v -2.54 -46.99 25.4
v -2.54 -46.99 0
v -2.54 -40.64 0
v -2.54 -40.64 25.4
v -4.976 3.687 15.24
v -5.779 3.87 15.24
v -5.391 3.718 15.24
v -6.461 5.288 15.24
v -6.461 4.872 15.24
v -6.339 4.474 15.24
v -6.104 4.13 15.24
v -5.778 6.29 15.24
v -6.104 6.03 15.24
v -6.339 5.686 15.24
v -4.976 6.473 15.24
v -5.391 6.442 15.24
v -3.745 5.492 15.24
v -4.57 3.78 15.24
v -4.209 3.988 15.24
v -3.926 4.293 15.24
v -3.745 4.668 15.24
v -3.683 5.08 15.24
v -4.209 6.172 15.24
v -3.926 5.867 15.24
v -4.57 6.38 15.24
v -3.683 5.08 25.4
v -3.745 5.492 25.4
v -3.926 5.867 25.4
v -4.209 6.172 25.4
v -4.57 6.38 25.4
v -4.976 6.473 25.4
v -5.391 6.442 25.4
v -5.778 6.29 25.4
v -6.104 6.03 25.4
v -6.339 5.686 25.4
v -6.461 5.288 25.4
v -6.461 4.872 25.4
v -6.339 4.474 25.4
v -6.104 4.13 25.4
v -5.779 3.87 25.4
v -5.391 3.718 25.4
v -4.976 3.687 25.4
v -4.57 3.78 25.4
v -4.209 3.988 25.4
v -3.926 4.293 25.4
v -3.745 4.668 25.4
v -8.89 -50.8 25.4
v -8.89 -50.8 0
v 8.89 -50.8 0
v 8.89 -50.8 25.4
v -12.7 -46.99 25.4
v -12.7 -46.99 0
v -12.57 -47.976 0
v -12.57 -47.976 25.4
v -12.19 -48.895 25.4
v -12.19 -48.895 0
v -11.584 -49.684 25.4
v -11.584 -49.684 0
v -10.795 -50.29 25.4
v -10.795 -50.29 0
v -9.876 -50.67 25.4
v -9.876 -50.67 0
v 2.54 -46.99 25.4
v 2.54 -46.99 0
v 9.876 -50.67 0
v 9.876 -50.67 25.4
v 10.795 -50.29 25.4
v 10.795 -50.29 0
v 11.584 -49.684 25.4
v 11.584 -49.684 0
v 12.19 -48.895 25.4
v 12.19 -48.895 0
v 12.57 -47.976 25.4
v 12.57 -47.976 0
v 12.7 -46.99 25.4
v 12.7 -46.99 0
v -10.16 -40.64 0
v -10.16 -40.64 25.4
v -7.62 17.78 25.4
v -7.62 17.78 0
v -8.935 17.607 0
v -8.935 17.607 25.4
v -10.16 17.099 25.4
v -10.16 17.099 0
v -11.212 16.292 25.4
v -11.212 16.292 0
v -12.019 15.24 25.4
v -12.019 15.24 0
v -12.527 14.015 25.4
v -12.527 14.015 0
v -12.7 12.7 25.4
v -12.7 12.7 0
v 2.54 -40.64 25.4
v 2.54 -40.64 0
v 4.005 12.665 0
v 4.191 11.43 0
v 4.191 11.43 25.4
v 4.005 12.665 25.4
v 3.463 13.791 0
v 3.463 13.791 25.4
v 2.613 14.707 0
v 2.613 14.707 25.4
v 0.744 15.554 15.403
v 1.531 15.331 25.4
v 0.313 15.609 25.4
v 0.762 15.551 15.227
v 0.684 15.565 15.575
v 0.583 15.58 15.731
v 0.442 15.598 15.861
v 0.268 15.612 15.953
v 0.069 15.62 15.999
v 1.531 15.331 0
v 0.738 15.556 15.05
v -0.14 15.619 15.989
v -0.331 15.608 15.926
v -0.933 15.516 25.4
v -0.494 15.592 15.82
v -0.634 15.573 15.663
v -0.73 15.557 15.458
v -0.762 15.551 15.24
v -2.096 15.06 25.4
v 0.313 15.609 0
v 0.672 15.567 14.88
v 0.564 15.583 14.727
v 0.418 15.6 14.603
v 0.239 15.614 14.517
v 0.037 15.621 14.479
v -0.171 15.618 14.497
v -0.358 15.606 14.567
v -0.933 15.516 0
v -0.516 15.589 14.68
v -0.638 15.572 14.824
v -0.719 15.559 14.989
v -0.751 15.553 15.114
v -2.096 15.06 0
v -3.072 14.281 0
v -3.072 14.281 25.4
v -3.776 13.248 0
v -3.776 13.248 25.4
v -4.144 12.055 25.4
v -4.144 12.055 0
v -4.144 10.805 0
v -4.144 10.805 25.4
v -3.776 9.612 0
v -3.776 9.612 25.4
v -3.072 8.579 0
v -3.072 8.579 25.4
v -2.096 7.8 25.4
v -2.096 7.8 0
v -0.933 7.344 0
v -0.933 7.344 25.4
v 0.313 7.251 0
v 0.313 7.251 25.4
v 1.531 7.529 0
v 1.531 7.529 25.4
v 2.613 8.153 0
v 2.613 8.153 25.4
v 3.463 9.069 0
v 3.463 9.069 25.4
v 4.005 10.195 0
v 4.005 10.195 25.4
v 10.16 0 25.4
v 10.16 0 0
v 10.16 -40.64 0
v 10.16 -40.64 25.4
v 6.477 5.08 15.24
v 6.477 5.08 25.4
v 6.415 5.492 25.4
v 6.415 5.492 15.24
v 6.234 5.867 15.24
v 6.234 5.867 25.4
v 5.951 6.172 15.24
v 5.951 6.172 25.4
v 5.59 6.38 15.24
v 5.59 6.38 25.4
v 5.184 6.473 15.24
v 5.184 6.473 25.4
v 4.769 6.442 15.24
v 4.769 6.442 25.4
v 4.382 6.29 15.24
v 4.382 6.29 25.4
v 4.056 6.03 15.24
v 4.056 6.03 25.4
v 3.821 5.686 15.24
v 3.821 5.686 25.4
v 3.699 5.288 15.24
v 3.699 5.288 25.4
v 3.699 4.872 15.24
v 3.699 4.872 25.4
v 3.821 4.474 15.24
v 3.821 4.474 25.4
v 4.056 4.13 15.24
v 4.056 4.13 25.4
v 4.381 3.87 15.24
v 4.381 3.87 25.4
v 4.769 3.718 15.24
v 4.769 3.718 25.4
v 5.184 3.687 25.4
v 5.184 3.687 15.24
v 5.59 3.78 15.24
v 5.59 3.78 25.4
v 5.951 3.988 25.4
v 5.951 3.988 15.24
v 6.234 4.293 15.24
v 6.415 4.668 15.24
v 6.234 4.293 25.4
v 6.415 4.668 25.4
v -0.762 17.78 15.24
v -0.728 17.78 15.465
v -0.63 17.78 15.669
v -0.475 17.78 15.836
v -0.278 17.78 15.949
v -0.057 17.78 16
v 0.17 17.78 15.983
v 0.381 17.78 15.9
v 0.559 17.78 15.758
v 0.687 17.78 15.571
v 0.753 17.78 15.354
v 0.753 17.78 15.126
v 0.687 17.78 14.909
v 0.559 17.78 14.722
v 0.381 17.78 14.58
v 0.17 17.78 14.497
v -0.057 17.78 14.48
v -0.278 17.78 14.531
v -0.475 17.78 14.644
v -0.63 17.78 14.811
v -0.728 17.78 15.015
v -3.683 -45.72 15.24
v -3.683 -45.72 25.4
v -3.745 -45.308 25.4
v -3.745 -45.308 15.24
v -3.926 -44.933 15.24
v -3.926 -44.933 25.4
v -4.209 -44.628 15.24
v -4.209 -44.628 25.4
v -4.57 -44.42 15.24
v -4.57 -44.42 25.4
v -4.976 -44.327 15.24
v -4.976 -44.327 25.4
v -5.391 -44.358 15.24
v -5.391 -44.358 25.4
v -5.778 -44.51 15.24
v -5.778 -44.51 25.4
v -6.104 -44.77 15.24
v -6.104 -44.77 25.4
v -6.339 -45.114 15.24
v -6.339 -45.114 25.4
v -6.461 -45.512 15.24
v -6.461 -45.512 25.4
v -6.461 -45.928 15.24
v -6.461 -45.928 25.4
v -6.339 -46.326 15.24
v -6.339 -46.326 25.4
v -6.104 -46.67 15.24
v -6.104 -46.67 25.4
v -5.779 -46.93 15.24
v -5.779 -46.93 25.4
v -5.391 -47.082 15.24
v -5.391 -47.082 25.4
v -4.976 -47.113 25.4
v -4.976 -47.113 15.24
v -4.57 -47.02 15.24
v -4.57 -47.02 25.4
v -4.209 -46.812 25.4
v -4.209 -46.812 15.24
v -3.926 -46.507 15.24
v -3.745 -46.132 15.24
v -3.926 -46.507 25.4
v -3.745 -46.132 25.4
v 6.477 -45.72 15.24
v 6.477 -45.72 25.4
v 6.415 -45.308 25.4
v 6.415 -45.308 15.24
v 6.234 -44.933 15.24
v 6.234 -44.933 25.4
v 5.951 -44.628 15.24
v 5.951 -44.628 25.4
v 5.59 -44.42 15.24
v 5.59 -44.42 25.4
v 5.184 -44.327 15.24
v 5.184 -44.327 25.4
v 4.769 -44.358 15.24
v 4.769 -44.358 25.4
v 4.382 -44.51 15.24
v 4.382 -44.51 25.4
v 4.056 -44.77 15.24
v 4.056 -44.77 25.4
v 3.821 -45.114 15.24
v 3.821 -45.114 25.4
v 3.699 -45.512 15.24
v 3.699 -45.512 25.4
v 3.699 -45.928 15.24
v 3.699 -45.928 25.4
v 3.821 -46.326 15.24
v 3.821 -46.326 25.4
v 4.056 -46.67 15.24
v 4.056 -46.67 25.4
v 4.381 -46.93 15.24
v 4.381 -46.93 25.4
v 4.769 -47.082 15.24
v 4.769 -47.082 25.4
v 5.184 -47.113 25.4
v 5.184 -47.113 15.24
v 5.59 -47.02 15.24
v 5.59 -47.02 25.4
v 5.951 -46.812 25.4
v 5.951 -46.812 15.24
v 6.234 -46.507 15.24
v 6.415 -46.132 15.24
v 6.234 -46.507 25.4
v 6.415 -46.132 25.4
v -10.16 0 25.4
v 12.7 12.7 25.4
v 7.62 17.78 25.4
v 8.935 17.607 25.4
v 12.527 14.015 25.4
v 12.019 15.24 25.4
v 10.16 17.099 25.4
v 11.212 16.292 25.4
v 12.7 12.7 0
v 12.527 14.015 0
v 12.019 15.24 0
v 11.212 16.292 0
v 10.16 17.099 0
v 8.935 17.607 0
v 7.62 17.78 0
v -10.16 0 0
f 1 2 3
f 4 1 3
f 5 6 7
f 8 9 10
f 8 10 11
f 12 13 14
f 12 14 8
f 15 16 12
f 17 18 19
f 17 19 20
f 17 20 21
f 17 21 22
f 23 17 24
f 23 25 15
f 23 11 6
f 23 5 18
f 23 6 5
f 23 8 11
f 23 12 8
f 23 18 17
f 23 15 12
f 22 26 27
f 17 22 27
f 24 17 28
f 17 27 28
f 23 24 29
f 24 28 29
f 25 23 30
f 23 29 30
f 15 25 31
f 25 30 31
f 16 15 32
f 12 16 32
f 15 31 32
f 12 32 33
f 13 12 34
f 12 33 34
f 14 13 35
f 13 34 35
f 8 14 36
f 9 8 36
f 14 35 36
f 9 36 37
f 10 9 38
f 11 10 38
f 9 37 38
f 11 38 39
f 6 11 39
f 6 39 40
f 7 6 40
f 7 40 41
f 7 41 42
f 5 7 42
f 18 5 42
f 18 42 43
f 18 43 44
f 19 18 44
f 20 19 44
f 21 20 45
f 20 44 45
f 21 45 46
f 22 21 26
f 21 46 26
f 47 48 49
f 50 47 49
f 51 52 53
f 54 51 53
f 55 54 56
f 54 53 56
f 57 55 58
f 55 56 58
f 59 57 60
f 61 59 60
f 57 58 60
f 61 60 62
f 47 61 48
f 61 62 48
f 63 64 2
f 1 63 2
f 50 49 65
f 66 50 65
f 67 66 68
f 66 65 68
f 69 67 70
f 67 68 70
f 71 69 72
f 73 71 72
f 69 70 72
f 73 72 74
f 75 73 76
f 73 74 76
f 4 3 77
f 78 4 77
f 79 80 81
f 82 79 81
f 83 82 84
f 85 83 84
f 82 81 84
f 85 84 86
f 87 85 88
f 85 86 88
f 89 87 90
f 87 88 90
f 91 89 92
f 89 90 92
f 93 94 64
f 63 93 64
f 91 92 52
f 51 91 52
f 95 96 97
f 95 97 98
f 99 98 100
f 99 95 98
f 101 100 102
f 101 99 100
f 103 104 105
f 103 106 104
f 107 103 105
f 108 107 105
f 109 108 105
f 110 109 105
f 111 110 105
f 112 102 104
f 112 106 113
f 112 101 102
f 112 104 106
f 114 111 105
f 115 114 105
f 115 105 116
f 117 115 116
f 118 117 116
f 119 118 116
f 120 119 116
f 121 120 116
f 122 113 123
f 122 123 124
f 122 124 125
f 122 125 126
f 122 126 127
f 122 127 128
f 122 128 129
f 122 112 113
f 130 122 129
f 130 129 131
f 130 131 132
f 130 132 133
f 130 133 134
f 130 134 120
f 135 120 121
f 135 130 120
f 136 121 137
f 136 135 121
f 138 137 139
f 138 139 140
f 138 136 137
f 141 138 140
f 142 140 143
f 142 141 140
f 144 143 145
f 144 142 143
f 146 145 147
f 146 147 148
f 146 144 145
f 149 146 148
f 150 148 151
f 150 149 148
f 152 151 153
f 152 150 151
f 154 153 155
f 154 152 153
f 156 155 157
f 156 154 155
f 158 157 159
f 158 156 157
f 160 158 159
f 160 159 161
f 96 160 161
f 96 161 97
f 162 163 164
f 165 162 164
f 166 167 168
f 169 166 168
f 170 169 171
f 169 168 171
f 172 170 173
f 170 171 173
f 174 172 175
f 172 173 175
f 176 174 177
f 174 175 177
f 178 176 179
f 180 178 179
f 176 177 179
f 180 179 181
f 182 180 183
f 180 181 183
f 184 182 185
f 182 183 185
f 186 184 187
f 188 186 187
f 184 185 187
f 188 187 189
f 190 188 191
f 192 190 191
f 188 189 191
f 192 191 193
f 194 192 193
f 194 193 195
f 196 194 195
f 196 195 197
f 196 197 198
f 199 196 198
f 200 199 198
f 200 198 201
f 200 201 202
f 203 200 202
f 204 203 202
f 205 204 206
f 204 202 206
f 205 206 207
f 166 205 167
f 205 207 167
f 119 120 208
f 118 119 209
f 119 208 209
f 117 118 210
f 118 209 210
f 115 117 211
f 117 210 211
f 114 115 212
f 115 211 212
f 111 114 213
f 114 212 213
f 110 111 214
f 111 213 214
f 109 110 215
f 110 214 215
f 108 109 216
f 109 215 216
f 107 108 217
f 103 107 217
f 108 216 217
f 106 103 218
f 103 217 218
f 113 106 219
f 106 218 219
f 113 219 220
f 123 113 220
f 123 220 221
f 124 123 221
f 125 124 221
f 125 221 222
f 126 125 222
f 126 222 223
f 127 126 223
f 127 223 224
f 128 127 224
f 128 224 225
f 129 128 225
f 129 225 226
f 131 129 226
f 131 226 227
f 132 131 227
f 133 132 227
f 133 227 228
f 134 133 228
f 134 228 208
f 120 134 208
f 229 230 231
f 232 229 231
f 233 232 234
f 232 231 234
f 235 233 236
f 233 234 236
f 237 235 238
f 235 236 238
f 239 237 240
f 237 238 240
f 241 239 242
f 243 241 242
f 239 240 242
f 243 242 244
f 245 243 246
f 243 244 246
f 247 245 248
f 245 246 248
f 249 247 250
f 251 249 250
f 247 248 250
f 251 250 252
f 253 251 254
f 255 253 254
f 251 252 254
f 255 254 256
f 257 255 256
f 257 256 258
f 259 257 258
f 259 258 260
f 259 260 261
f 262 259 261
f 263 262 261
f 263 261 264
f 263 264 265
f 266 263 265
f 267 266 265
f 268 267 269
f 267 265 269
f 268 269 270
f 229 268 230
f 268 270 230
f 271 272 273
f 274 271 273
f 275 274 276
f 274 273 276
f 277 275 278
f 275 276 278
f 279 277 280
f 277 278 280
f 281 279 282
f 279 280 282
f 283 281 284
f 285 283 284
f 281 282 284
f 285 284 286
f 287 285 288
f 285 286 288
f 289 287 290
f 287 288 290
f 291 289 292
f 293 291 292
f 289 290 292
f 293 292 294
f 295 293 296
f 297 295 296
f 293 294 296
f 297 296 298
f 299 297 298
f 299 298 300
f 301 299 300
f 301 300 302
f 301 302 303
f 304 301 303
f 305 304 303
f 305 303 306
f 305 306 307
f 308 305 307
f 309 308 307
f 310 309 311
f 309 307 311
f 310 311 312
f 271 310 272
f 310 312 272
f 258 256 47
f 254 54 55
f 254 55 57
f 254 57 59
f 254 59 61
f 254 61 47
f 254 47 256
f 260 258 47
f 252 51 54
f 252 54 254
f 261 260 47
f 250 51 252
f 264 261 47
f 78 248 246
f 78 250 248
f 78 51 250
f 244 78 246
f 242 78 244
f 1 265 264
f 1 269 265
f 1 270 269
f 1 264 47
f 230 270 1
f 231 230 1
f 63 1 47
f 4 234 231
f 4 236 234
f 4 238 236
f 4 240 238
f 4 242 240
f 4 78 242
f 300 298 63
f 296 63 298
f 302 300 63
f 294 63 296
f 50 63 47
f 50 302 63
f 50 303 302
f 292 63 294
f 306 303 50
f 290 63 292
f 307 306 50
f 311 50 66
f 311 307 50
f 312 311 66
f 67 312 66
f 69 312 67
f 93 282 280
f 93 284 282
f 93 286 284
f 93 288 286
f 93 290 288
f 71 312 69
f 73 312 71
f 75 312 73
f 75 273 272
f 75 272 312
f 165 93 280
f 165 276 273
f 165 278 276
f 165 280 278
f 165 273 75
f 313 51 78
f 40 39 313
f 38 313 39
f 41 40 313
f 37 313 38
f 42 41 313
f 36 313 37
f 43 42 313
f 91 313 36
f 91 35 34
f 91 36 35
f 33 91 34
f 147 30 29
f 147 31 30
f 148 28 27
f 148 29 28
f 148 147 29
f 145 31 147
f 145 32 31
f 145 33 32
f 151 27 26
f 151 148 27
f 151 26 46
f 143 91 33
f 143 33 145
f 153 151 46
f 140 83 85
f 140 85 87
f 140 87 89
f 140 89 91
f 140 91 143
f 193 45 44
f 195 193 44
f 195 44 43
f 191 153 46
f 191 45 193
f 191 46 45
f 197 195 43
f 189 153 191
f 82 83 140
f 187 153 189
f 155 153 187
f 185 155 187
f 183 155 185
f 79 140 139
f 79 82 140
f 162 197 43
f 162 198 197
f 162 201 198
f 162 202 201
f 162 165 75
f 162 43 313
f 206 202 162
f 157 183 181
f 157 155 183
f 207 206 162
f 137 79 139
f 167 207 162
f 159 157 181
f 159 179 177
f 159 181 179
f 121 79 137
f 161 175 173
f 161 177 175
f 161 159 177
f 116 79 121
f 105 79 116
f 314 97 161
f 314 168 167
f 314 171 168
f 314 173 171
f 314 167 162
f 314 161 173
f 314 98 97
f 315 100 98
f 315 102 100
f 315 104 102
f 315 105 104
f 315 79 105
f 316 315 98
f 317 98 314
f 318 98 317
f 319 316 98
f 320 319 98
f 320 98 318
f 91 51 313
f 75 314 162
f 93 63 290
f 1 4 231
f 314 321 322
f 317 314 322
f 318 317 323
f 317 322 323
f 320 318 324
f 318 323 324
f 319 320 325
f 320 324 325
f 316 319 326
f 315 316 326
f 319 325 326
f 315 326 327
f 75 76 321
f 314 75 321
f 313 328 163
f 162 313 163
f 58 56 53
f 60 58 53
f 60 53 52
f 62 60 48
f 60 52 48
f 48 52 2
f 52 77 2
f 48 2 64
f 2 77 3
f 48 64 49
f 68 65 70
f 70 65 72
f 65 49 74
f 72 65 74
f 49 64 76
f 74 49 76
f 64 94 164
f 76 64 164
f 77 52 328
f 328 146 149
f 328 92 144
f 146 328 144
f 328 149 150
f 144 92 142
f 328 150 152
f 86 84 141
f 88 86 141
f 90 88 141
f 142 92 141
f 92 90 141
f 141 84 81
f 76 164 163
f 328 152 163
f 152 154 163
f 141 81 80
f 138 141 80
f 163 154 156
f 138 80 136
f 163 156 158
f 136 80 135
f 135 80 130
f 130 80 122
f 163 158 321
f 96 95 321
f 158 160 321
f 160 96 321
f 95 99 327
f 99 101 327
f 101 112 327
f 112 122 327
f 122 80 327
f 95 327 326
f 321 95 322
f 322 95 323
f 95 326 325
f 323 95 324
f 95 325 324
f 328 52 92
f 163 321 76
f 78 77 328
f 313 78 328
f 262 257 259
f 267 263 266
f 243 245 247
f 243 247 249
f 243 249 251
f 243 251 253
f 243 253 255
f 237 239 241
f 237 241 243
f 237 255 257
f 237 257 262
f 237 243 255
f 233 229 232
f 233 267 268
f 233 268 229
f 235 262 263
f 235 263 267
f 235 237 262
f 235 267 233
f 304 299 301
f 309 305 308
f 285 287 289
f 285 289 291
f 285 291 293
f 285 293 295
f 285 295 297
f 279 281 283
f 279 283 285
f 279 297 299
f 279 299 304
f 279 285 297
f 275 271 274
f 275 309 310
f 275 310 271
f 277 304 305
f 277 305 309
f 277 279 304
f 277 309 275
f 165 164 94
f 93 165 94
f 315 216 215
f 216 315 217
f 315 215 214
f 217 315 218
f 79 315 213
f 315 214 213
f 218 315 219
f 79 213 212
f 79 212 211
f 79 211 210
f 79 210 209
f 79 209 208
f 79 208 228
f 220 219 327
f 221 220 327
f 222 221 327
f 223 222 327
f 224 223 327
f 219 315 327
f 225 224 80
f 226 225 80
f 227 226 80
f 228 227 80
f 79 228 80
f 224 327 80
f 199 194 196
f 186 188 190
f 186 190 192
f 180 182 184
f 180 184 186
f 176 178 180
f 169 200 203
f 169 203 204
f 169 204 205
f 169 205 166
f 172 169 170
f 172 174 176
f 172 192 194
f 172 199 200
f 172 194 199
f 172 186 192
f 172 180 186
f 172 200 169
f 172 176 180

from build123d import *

# Parameters (mm, degrees)
F0_R     = 4.191
F1_DEPTH = 25.4
F3_R     = 1.397
F4_DEPTH = 10.16
F2_R     = 0.762
F5_DEPTH = 5.08


with BuildPart() as f1:
    # F0 (on Top) → F1 (new body)
    with BuildSketch(Plane.XY):
        with BuildLine():
            Line((7.62, 17.78), (-7.62, 17.78))
            ThreePointArc((-7.62, 17.78), (-11.212102, 16.292102), (-12.7, 12.7))
            Line((-12.7, 12.7), (-12.7, -46.99))
            ThreePointArc((-12.7, -46.99), (-11.584077, -49.684077), (-8.89, -50.8))
            Line((-8.89, -50.8), (8.89, -50.8))
            ThreePointArc((8.89, -50.8), (11.584077, -49.684077), (12.7, -46.99))
            Line((12.7, -46.99), (12.7, 12.7))
            ThreePointArc((12.7, 12.7), (11.212102, 16.292102), (7.62, 17.78))
        make_face()
        Polygon((-10.16, -40.64), (-10.16, 0), (10.16, 0), (10.16, -40.64), (2.54, -40.64), (2.54, -46.99), (-2.54, -46.99), (-2.54, -40.64), align=None, mode=Mode.SUBTRACT)
        with Locations((0, 11.43)):
            Circle(F0_R, mode=Mode.SUBTRACT)
    extrude(amount=F1_DEPTH)

    # F3 (on face) → F4 (cut)
    with BuildSketch(Plane.XY.offset(25.4)):
        with Locations((-5.08, 5.08)):
            Circle(F3_R)
        with Locations((5.08, 5.08)):
            Circle(F3_R)
        with Locations((5.08, -45.72)):
            Circle(F3_R)
        with Locations((-5.08, -45.72)):
            Circle(F3_R)
    extrude(amount=-F4_DEPTH, mode=Mode.SUBTRACT)

    # F2 (on face) → F5 (cut)
    with BuildSketch(Plane(origin=(0, 17.78, 0), x_dir=(-1, 0, 0), z_dir=(0, 1, 0))):
        with Locations((0, 15.24)):
            Circle(F2_R)
    extrude(amount=-F5_DEPTH, mode=Mode.SUBTRACT)


solid = f1.part
